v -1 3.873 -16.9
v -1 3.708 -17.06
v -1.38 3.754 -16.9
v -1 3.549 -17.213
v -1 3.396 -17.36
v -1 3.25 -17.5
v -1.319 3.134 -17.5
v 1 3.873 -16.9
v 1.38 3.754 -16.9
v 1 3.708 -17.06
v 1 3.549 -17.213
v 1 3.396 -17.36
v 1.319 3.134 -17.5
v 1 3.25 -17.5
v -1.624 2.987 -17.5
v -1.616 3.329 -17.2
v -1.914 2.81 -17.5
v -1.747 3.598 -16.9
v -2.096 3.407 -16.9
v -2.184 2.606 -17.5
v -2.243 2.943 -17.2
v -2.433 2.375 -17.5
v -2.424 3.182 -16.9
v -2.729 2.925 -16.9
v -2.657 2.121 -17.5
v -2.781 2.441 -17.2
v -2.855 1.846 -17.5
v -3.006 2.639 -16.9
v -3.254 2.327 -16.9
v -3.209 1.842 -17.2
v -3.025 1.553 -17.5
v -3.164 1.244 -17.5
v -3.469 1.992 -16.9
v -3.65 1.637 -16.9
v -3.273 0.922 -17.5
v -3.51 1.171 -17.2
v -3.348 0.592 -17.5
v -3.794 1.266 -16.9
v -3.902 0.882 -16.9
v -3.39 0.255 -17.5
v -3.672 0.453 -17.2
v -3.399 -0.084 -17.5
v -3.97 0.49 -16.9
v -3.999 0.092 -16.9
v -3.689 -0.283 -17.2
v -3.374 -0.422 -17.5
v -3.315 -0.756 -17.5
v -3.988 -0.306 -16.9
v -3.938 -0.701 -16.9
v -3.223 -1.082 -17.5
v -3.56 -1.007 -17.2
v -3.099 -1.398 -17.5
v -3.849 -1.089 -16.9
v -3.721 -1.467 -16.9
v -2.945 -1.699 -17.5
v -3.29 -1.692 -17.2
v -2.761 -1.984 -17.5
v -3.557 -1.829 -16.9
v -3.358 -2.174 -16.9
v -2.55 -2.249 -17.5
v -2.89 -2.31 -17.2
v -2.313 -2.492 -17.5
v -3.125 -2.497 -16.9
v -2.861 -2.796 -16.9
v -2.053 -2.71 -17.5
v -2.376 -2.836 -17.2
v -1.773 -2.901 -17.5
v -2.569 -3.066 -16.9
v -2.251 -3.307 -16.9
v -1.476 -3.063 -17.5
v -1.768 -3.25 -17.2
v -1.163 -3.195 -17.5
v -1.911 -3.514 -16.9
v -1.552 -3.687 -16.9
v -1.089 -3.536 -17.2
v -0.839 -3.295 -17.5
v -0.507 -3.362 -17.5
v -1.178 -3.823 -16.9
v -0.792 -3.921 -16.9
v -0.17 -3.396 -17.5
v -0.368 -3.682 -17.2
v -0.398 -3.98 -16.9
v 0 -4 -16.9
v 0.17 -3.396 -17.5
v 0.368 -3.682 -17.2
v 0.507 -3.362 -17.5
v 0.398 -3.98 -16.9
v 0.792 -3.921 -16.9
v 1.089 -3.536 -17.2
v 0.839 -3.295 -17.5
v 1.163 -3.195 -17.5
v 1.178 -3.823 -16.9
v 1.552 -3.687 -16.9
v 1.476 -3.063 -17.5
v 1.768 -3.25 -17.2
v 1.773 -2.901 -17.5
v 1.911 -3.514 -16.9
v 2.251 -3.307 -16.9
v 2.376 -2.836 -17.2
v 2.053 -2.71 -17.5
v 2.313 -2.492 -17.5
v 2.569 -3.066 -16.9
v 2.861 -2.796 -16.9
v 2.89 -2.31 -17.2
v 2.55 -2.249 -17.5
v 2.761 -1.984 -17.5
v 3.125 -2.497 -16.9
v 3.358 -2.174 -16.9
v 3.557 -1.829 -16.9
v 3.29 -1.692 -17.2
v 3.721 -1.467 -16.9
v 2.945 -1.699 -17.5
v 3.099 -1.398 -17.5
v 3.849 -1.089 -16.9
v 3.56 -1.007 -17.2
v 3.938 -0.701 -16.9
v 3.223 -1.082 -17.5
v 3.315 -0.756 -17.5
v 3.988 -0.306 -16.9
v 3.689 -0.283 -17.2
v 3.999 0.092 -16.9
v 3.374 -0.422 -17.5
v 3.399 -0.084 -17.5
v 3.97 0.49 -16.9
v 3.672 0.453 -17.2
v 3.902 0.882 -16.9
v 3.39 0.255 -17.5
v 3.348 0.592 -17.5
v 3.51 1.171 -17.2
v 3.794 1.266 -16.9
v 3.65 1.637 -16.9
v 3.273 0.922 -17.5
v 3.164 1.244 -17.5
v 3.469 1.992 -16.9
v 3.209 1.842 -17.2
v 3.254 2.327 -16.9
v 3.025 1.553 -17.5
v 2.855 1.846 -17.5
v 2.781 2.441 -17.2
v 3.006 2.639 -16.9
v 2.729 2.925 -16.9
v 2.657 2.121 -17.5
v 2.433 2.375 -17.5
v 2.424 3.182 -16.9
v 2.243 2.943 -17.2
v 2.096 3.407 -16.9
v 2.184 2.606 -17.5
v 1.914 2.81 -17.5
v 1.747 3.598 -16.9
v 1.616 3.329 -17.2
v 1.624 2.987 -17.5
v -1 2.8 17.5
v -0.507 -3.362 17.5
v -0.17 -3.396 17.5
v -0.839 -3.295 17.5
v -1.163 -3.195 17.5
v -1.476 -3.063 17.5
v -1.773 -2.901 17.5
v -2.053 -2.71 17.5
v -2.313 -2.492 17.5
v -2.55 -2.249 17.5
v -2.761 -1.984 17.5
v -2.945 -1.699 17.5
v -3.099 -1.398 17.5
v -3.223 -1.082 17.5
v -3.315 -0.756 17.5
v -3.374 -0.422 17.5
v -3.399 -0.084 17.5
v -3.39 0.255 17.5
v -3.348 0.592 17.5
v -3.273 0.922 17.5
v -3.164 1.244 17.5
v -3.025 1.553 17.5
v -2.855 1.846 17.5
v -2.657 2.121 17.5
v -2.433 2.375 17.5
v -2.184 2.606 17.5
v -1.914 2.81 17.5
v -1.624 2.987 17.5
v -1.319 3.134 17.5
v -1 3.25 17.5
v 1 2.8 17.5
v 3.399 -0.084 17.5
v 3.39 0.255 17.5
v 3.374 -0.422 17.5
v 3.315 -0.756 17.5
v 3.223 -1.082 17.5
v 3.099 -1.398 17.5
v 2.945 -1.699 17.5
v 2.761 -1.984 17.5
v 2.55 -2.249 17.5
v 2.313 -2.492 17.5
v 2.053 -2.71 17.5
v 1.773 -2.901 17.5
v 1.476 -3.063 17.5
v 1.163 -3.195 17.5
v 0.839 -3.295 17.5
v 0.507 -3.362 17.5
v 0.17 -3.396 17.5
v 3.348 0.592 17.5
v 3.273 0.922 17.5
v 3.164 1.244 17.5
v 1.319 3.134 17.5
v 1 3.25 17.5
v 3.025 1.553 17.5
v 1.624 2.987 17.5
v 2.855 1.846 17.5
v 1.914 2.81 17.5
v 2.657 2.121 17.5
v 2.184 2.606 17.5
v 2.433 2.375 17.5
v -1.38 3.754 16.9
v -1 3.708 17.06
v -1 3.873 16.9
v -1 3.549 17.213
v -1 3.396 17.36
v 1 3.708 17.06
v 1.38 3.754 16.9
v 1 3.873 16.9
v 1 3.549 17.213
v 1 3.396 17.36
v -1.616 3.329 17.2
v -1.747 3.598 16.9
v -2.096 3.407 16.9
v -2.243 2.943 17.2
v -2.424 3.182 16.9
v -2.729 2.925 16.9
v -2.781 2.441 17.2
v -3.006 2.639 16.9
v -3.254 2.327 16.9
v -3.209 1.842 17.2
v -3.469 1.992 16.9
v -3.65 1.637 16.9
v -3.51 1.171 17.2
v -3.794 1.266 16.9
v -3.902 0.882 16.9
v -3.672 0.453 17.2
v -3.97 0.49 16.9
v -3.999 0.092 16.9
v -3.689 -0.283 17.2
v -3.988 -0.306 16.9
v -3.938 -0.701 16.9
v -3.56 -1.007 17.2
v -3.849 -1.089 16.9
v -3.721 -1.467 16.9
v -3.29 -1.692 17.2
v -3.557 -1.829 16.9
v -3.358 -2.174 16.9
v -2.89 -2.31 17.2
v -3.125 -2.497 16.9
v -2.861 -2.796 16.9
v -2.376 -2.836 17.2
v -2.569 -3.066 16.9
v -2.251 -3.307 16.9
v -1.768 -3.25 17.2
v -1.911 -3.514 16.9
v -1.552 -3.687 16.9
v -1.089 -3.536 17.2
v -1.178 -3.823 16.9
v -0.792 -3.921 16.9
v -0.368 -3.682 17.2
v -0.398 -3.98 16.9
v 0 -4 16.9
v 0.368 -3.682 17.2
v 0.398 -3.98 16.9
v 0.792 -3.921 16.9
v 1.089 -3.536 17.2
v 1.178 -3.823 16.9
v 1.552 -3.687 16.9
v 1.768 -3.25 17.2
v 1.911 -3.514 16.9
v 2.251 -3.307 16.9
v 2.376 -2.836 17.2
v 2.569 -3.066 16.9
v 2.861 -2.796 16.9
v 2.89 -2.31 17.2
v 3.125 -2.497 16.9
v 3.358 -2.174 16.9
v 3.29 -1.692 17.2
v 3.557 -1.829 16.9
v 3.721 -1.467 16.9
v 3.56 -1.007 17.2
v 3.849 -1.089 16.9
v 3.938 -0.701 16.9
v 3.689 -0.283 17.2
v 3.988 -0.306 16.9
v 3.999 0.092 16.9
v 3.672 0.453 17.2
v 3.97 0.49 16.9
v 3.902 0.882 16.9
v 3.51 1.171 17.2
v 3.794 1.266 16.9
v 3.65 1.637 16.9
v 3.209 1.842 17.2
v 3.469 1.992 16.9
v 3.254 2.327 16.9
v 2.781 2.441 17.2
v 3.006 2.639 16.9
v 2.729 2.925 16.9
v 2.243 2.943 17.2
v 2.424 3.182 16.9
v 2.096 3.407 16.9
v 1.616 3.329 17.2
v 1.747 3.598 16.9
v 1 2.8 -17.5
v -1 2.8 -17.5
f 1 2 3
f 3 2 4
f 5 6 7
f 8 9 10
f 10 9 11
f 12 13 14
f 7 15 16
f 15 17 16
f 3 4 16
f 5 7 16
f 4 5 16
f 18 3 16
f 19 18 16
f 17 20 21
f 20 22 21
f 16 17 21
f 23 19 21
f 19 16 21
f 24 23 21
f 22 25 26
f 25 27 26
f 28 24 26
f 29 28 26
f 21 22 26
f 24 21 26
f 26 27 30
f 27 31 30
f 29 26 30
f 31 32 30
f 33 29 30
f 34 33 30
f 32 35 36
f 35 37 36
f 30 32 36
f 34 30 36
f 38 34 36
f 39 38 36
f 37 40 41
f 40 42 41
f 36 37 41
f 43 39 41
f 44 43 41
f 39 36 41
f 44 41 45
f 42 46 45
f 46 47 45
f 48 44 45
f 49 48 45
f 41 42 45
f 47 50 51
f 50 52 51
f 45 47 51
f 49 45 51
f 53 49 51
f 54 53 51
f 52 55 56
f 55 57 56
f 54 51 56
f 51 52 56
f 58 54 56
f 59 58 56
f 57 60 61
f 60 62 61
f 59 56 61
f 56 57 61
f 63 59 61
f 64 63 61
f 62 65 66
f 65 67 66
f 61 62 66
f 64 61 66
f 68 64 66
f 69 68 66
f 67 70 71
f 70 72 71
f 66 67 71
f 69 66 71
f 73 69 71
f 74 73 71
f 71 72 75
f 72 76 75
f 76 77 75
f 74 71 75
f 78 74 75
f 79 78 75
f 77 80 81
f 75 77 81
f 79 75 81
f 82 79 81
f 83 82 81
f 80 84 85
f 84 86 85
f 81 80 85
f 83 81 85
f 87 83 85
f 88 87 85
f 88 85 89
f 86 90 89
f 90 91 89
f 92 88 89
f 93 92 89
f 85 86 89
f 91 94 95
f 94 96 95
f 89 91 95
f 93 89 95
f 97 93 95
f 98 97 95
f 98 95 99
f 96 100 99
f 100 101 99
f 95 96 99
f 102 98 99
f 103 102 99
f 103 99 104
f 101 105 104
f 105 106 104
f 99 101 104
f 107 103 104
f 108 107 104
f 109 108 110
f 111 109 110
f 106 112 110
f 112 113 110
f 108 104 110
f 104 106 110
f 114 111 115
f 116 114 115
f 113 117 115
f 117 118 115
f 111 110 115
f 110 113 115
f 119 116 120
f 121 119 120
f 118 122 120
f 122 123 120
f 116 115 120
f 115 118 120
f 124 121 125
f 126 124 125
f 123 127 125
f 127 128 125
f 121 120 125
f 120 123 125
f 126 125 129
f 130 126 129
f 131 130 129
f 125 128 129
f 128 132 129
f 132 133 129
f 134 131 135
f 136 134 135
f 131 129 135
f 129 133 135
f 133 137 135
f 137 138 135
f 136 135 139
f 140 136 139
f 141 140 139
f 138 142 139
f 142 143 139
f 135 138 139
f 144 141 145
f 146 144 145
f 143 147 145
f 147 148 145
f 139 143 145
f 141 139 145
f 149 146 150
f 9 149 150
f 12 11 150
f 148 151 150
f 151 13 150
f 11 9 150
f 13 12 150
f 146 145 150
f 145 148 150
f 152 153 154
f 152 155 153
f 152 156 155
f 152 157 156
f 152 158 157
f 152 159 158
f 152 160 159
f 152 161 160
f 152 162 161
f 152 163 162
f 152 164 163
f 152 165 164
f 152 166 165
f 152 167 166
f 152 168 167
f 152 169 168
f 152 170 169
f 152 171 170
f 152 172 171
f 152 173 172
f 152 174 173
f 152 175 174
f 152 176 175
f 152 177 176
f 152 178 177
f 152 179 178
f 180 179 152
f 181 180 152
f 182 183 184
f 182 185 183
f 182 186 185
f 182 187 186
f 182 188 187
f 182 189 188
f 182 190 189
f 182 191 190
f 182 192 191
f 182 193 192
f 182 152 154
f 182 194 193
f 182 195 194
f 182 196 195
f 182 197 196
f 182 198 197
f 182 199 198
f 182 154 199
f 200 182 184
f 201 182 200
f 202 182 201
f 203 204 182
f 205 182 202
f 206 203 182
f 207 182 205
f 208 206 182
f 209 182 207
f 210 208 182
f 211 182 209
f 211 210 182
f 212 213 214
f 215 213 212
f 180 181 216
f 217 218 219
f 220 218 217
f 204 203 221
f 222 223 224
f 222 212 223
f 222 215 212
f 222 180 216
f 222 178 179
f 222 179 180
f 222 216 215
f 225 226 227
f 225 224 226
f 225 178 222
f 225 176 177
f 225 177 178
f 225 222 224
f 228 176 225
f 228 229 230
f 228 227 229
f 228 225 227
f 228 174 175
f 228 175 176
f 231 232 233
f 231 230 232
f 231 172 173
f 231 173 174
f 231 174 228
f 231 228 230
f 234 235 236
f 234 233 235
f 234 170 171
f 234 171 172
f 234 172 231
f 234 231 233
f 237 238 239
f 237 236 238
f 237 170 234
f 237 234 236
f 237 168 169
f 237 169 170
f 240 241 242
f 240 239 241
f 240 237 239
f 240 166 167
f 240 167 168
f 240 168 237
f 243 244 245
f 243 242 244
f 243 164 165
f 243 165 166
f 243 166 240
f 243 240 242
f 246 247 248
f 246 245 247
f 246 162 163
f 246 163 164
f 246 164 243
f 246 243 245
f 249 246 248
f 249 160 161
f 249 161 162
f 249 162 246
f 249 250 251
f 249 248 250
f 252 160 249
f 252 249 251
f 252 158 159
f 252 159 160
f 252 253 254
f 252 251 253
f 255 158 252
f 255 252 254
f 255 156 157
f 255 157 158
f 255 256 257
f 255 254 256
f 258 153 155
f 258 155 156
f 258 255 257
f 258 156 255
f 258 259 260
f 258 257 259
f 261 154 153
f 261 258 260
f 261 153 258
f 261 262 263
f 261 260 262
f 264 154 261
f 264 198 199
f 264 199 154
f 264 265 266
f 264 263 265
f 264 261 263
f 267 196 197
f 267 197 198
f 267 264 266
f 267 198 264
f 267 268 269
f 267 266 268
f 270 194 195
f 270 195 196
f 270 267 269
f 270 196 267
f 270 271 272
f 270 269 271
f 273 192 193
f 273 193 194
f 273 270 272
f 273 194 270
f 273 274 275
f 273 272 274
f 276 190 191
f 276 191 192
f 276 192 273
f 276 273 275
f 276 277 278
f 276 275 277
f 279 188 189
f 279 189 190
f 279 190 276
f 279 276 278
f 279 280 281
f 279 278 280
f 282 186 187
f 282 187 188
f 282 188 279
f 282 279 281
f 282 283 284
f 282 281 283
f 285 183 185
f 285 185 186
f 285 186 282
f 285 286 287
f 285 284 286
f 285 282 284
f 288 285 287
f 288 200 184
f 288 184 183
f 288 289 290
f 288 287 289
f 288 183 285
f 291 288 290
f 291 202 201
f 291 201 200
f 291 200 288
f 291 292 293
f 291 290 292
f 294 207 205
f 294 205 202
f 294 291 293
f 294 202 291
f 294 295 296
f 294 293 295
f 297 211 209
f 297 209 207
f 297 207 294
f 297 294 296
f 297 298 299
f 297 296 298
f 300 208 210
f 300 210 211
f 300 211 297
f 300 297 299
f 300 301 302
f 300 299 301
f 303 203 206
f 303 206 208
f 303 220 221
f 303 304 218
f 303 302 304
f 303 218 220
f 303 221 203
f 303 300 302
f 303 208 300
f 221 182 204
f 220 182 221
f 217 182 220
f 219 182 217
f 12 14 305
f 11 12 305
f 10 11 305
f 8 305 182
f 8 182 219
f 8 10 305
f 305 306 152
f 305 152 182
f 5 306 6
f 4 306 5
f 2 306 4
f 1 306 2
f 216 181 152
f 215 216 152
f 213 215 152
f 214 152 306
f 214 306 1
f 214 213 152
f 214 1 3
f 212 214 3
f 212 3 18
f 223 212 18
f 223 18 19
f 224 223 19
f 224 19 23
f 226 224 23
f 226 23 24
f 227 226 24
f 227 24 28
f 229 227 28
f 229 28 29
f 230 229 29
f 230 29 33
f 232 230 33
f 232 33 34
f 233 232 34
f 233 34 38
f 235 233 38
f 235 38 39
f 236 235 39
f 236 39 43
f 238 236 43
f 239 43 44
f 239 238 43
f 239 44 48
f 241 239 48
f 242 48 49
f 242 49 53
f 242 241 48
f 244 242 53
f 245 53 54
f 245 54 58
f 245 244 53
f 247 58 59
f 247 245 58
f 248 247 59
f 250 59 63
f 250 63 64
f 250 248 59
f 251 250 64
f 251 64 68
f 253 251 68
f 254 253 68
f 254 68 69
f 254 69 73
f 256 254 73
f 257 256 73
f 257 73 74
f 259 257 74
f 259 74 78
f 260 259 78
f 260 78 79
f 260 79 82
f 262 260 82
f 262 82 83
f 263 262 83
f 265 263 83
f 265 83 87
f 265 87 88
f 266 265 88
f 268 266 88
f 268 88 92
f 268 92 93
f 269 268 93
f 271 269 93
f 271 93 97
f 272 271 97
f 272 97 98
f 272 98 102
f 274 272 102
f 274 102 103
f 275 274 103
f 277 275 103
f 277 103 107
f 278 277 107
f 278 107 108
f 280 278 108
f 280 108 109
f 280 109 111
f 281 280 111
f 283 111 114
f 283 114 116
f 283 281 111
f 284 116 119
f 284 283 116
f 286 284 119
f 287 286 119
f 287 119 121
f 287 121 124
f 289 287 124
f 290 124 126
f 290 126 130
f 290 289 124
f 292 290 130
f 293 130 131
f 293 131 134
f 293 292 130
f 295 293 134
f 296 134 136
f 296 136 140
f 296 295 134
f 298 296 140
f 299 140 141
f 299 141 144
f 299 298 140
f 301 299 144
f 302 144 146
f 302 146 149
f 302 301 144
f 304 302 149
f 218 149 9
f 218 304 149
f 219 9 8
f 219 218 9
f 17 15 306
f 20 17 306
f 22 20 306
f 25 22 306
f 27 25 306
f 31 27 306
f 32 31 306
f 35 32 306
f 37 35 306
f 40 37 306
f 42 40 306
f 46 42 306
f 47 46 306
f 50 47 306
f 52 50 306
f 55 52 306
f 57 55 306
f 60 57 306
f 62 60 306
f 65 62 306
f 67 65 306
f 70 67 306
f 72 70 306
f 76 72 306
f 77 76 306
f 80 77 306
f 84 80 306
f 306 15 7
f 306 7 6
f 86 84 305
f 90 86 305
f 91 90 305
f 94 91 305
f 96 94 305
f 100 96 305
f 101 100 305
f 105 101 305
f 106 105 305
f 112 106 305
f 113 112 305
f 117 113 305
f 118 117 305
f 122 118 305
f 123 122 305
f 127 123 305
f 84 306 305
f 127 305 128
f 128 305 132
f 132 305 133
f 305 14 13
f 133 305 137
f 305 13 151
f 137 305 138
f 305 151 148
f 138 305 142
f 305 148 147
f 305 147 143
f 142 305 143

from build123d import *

# Parameters (mm, degrees)
SKETCH1_R           = 4
EXTRUDE1_DEPTH      = 17.5
CHAMFER1_SIZE       = 0.6
SKETCH3_W           = 2
SKETCH3_H           = 1.2
EXTRUDE2_DEPTH      = 18.5
EXTRUDE2_DEPTH_BACK = 18.5


with BuildPart() as part:
    # Sketch1 → Extrude1 (new body, symmetric)
    with BuildSketch(Plane.XY):
        Circle(SKETCH1_R)
    extrude(amount=EXTRUDE1_DEPTH, both=True)

    # Chamfer1
    chamfer1_edges = [part.edges().sort_by_distance(p)[0] for p in [
        (-4, 0, -17.5),
        (-4, 0, 17.5),
    ]]
    chamfer(chamfer1_edges, length=CHAMFER1_SIZE)

    # Sketch3 → Extrude2 (cut, two sides)
    with BuildSketch(Plane.XY) as extrude2_sk:
        with Locations((0, 3.4)):
            Rectangle(SKETCH3_W, SKETCH3_H)
    extrude(amount=EXTRUDE2_DEPTH, mode=Mode.SUBTRACT)
    extrude(extrude2_sk.sketch, amount=-EXTRUDE2_DEPTH_BACK, mode=Mode.SUBTRACT)


solid = part.part
